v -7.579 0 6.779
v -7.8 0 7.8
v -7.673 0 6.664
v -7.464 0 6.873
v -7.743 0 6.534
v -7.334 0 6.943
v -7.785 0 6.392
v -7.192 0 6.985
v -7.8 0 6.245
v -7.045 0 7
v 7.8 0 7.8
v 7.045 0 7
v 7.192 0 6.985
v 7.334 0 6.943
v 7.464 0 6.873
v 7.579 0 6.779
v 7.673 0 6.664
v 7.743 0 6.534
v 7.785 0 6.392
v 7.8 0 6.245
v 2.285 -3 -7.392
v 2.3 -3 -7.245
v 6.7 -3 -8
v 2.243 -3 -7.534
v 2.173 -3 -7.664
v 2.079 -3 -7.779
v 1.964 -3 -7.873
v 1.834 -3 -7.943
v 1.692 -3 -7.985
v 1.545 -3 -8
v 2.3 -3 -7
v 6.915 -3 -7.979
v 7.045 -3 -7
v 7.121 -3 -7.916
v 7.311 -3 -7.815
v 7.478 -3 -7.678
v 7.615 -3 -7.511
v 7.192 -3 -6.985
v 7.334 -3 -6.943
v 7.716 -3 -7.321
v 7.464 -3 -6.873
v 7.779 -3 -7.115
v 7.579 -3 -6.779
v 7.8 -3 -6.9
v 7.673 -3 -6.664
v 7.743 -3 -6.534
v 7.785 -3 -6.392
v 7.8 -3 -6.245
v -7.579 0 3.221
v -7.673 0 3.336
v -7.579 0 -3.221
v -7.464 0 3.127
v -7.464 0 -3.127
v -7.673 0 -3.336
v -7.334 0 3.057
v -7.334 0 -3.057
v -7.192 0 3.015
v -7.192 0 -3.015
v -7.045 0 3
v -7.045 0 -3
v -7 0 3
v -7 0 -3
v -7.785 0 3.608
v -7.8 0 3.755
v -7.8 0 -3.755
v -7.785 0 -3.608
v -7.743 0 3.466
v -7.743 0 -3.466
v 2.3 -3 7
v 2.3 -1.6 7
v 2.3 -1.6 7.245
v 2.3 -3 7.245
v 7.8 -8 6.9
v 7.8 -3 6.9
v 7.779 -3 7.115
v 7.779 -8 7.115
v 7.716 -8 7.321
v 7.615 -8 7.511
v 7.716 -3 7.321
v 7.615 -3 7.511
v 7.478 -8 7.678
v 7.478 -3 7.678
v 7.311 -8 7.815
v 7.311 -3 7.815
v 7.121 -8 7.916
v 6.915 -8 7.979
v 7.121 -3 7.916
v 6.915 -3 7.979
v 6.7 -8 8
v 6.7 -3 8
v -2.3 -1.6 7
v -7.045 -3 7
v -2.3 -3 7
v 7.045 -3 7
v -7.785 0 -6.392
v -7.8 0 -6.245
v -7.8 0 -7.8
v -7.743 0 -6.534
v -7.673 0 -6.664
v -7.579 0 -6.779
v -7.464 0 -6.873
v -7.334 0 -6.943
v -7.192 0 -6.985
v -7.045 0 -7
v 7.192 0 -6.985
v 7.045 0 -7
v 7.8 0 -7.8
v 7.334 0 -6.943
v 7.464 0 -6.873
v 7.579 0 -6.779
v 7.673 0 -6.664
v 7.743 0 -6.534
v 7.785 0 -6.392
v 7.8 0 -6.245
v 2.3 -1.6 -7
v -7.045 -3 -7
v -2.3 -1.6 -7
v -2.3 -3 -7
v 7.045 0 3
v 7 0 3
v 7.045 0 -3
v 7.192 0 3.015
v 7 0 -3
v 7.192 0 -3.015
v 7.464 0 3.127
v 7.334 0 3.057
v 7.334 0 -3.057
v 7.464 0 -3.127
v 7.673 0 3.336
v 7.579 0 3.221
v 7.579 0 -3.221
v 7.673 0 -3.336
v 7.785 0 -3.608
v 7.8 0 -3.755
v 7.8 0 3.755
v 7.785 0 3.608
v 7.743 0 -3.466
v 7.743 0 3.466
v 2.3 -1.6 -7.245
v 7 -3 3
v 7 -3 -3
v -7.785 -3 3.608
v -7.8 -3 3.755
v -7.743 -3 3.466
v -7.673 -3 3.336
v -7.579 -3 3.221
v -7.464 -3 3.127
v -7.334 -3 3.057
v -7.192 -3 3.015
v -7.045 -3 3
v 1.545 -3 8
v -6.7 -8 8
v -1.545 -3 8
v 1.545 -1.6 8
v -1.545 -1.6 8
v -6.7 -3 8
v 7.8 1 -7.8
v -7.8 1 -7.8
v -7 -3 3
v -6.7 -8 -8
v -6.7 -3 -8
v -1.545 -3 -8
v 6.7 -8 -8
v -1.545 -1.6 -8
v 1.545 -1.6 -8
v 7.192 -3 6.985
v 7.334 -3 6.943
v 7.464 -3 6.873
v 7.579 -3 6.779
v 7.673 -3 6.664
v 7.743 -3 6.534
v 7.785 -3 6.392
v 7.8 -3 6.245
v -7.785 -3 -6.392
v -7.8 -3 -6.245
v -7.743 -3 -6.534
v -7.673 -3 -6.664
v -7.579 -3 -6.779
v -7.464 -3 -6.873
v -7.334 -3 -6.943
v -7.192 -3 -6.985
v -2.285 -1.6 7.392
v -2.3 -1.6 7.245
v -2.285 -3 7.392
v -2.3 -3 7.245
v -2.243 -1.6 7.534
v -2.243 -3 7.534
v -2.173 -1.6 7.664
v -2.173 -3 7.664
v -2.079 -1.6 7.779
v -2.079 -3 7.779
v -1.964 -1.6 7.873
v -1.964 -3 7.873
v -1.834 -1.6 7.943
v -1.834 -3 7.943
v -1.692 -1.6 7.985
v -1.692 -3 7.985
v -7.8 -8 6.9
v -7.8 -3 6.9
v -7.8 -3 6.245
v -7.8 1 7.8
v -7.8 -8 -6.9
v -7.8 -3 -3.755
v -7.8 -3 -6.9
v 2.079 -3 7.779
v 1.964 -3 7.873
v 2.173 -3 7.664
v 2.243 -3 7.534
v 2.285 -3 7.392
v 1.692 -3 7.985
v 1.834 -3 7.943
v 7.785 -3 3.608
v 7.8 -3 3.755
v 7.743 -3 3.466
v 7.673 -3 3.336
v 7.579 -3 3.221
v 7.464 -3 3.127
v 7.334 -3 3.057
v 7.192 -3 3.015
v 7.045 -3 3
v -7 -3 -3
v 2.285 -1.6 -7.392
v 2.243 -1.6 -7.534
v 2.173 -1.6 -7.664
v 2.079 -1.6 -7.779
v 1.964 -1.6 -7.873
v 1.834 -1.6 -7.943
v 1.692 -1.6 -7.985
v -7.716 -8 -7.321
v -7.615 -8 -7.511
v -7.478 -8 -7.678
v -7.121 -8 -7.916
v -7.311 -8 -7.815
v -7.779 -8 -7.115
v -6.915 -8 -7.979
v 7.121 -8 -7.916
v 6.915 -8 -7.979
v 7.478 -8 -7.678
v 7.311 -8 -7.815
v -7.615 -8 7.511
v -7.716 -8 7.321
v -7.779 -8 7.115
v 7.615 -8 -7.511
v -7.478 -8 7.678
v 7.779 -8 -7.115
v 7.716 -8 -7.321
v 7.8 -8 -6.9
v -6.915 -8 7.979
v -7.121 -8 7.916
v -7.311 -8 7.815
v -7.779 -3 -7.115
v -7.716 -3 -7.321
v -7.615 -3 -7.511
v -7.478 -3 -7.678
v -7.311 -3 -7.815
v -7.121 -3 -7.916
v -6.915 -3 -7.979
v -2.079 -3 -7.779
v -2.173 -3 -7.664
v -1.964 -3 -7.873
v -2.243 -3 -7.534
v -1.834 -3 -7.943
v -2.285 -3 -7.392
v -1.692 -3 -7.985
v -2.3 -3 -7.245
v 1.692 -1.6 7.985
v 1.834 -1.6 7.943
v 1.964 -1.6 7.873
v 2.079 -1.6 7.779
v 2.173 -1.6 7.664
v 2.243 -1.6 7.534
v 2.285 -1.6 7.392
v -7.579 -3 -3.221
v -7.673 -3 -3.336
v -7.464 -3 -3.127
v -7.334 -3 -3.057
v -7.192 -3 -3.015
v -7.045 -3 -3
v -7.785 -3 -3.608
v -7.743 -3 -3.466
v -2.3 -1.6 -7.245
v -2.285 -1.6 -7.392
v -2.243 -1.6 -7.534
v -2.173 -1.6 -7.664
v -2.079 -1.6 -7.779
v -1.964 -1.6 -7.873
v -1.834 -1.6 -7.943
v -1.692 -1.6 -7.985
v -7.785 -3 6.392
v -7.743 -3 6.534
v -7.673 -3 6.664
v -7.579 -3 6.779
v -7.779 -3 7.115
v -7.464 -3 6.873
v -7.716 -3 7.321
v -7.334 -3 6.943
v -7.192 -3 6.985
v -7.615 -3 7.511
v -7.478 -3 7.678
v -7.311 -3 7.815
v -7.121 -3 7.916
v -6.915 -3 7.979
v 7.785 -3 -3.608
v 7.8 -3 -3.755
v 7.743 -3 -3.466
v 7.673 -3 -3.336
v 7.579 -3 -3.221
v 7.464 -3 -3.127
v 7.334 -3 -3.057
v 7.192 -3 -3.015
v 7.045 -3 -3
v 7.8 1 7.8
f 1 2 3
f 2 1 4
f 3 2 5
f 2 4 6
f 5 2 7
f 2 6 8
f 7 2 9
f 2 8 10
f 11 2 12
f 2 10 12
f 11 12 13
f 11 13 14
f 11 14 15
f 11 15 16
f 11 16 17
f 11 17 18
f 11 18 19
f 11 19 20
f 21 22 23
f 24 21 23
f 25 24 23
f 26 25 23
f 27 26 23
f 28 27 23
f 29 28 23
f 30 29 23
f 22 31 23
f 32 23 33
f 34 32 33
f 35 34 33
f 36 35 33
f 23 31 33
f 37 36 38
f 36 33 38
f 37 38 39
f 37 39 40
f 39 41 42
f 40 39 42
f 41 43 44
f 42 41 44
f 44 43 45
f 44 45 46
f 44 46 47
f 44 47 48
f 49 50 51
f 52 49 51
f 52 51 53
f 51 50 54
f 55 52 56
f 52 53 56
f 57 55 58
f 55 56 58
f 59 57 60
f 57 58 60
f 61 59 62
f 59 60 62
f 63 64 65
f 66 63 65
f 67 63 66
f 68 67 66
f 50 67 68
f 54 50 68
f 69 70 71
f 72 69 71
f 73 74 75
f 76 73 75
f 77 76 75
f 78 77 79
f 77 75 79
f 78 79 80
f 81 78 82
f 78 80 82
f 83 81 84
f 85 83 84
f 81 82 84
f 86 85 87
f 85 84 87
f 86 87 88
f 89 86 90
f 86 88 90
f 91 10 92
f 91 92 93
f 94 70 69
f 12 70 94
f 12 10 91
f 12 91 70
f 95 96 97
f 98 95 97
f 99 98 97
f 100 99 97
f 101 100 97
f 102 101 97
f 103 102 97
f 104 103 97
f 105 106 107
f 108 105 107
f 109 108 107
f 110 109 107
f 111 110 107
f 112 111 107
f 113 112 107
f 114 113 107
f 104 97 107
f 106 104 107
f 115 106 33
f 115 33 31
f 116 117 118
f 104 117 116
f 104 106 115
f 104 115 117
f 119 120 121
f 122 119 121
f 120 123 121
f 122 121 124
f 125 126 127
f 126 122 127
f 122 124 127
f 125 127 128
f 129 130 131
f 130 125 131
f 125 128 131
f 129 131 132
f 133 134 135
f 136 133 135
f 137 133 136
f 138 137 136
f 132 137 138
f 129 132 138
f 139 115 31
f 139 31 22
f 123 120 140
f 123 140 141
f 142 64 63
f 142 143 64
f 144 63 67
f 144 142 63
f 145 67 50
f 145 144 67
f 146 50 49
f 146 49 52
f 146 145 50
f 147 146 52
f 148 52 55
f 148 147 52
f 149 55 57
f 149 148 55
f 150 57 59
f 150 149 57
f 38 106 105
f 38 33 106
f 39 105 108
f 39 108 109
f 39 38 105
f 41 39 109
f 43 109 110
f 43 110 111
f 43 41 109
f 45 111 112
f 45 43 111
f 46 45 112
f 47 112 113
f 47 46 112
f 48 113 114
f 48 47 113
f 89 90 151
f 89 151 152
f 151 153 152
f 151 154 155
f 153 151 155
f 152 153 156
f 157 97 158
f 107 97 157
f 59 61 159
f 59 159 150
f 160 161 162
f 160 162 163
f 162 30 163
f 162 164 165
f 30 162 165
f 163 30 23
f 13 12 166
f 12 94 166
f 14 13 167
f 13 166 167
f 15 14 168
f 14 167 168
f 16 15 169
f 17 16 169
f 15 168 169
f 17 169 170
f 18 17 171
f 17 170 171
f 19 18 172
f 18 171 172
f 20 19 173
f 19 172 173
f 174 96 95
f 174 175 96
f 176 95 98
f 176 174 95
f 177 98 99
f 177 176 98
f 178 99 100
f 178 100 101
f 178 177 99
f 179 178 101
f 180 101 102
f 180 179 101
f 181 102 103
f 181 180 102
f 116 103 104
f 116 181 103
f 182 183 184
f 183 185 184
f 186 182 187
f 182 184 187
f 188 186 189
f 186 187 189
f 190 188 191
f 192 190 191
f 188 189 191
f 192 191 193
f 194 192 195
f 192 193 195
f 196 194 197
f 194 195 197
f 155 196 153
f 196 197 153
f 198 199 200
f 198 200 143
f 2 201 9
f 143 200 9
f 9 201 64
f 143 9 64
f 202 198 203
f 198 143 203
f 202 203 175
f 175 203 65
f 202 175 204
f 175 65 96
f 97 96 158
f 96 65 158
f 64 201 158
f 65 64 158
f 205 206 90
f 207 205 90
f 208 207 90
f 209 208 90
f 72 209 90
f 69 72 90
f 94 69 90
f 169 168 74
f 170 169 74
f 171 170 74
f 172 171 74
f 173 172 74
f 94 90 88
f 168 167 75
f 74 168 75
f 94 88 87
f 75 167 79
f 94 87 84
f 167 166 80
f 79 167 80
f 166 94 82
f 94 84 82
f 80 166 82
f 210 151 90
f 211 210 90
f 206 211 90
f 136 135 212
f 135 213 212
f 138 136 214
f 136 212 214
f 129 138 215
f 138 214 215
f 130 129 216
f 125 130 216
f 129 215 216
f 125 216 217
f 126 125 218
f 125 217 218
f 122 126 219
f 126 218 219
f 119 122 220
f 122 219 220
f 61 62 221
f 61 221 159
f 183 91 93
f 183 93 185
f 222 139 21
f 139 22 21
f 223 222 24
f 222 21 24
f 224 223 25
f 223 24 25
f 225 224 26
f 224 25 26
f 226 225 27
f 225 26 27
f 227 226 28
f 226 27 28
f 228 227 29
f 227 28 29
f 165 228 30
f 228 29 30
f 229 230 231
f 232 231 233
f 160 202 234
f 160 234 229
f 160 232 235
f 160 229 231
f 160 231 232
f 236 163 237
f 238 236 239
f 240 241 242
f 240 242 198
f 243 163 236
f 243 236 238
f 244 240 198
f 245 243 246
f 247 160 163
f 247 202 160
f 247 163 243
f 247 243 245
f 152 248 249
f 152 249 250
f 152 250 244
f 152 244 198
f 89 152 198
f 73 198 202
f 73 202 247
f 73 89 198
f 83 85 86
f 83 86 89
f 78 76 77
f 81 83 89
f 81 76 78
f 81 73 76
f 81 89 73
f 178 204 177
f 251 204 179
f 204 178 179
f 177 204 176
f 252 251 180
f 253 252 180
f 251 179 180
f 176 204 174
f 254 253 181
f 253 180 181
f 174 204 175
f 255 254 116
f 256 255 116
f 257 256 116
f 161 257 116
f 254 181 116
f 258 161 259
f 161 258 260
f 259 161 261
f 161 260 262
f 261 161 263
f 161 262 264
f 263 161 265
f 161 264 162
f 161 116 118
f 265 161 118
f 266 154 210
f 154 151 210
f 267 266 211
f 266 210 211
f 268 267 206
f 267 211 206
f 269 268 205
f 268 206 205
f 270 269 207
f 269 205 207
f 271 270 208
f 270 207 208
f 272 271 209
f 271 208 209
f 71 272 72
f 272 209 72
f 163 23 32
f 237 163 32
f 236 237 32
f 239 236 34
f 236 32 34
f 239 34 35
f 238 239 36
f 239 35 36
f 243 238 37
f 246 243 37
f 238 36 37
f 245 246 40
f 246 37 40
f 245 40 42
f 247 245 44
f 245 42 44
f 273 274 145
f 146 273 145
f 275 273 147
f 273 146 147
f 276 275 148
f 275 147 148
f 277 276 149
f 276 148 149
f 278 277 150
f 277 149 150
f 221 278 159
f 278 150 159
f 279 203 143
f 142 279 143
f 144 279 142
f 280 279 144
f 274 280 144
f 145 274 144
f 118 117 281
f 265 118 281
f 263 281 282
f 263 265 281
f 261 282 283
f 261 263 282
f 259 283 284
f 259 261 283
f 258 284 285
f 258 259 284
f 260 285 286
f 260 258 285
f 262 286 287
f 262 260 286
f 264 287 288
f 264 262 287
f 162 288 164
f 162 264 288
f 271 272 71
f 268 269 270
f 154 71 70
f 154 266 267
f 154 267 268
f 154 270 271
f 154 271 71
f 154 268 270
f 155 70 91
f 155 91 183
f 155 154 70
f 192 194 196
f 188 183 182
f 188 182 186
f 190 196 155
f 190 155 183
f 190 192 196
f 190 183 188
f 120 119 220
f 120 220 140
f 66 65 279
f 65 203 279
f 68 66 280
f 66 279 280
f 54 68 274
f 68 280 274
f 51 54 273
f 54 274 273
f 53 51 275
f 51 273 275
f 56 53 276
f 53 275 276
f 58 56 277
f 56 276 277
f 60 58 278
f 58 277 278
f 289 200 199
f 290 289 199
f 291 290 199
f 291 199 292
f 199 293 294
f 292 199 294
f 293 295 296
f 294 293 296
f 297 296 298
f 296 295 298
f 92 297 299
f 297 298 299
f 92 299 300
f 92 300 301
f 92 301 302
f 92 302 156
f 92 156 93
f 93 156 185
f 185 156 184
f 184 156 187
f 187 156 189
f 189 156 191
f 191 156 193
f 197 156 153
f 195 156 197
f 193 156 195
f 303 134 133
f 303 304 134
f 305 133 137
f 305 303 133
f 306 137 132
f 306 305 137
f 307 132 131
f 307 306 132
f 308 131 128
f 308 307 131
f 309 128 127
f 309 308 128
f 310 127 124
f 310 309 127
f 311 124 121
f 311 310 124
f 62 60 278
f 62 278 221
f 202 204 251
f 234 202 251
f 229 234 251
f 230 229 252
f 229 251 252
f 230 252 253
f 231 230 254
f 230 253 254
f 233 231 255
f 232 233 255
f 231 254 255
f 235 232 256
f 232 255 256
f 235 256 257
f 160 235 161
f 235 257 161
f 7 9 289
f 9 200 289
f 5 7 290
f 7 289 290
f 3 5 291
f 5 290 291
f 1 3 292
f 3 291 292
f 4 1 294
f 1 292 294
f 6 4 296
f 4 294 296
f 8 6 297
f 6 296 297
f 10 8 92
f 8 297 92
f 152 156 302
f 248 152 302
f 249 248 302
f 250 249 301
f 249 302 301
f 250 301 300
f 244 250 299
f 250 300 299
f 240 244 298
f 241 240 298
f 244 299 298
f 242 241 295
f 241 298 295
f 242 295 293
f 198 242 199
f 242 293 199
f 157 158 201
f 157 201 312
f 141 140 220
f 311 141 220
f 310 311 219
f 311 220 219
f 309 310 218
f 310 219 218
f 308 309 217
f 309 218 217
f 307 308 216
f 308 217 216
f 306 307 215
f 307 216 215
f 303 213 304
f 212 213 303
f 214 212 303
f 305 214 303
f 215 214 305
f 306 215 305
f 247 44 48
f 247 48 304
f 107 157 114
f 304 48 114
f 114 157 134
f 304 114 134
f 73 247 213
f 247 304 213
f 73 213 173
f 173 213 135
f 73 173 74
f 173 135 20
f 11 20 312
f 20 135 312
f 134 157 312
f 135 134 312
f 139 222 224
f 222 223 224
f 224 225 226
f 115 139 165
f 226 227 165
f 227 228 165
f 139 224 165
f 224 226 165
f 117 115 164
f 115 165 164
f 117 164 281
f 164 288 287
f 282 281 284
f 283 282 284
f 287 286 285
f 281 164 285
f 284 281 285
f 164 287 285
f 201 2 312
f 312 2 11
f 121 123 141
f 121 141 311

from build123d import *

# Parameters (mm, degrees)
SKETCH2_W           = 15.6
SKETCH2_H           = 15.6
BOSS_EXTRUDE2_DEPTH = 1
BOSS_EXTRUDE1_DEPTH = 3
SKETCH3_W           = 4.6
SKETCH3_H           = 1
BOSS_EXTRUDE3_DEPTH = 1.4
FILLET1_R           = 0.755
BOSS_EXTRUDE4_DEPTH = 5


with BuildPart() as part:
    # Sketch2 → Boss-Extrude2 (new body)
    with BuildSketch(Plane(origin=(0, 0, 0), x_dir=(1, 0, 0), z_dir=(0, 1, 0))):
        Rectangle(SKETCH2_W, SKETCH2_H)
    extrude(amount=BOSS_EXTRUDE2_DEPTH)

    # Cutout → Boss-Extrude1 (add)
    with BuildSketch(Plane(origin=(0, 0, 0), x_dir=(1, 0, 0), z_dir=(0, 1, 0))):
        Polygon((-7.8, 3), (-7, 3), (-7, -3), (-7.8, -3), (-7.8, -7), (7.8, -7), (7.8, -3), (7, -3), (7, 3), (7.8, 3), (7.8, 7), (-7.8, 7), align=None)
    extrude(amount=-BOSS_EXTRUDE1_DEPTH)

    # Sketch3 → Boss-Extrude3 (add)
    with BuildSketch(Plane(origin=(0, -1.6, 0), x_dir=(-1, 0, 0), z_dir=(0, 1, 0))):
        with Locations((0, 7.5)):
            Rectangle(SKETCH3_W, SKETCH3_H)
    boss_extrude3 = extrude(amount=-BOSS_EXTRUDE3_DEPTH)

    # Mirror1: Boss-Extrude3 across plane
    add(boss_extrude3.mirror(Plane.XY))

    # Fillet1
    fillet1_edges = [part.edges().sort_by_distance(p)[0] for p in [
        (7.8, -1.5, 7),
        (7.8, -1.5, 3),
        (7.8, -1.5, -3),
        (7.8, -1.5, -7),
        (2.3, -2.3, -8),
        (-2.3, -2.3, -8),
        (-7.8, -1.5, -3),
        (-7.8, -1.5, -7),
        (2.3, -2.3, 8),
        (-2.3, -2.3, 8),
        (-7.8, -1.5, 7),
        (-7.8, -1.5, 3),
    ]]
    fillet(fillet1_edges, radius=FILLET1_R)

    # Sketch4 → Boss-Extrude4 (add)
    with BuildSketch(Plane.XZ.offset(3)):
        with BuildLine():
            Line((-6.7, -8), (6.7, -8))
            ThreePointArc((6.7, -8), (7.477817459, -7.677817459), (7.8, -6.9))
            Line((7.8, -6.9), (7.8, 6.9))
            ThreePointArc((7.8, 6.9), (7.477817459, 7.677817459), (6.7, 8))
            Line((6.7, 8), (-6.7, 8))
            ThreePointArc((-6.7, 8), (-7.477817459, 7.677817459), (-7.8, 6.9))
            Line((-7.8, 6.9), (-7.8, -6.9))
            ThreePointArc((-7.8, -6.9), (-7.477817459, -7.677817459), (-6.7, -8))
        make_face()
    extrude(amount=BOSS_EXTRUDE4_DEPTH)


solid = part.part
